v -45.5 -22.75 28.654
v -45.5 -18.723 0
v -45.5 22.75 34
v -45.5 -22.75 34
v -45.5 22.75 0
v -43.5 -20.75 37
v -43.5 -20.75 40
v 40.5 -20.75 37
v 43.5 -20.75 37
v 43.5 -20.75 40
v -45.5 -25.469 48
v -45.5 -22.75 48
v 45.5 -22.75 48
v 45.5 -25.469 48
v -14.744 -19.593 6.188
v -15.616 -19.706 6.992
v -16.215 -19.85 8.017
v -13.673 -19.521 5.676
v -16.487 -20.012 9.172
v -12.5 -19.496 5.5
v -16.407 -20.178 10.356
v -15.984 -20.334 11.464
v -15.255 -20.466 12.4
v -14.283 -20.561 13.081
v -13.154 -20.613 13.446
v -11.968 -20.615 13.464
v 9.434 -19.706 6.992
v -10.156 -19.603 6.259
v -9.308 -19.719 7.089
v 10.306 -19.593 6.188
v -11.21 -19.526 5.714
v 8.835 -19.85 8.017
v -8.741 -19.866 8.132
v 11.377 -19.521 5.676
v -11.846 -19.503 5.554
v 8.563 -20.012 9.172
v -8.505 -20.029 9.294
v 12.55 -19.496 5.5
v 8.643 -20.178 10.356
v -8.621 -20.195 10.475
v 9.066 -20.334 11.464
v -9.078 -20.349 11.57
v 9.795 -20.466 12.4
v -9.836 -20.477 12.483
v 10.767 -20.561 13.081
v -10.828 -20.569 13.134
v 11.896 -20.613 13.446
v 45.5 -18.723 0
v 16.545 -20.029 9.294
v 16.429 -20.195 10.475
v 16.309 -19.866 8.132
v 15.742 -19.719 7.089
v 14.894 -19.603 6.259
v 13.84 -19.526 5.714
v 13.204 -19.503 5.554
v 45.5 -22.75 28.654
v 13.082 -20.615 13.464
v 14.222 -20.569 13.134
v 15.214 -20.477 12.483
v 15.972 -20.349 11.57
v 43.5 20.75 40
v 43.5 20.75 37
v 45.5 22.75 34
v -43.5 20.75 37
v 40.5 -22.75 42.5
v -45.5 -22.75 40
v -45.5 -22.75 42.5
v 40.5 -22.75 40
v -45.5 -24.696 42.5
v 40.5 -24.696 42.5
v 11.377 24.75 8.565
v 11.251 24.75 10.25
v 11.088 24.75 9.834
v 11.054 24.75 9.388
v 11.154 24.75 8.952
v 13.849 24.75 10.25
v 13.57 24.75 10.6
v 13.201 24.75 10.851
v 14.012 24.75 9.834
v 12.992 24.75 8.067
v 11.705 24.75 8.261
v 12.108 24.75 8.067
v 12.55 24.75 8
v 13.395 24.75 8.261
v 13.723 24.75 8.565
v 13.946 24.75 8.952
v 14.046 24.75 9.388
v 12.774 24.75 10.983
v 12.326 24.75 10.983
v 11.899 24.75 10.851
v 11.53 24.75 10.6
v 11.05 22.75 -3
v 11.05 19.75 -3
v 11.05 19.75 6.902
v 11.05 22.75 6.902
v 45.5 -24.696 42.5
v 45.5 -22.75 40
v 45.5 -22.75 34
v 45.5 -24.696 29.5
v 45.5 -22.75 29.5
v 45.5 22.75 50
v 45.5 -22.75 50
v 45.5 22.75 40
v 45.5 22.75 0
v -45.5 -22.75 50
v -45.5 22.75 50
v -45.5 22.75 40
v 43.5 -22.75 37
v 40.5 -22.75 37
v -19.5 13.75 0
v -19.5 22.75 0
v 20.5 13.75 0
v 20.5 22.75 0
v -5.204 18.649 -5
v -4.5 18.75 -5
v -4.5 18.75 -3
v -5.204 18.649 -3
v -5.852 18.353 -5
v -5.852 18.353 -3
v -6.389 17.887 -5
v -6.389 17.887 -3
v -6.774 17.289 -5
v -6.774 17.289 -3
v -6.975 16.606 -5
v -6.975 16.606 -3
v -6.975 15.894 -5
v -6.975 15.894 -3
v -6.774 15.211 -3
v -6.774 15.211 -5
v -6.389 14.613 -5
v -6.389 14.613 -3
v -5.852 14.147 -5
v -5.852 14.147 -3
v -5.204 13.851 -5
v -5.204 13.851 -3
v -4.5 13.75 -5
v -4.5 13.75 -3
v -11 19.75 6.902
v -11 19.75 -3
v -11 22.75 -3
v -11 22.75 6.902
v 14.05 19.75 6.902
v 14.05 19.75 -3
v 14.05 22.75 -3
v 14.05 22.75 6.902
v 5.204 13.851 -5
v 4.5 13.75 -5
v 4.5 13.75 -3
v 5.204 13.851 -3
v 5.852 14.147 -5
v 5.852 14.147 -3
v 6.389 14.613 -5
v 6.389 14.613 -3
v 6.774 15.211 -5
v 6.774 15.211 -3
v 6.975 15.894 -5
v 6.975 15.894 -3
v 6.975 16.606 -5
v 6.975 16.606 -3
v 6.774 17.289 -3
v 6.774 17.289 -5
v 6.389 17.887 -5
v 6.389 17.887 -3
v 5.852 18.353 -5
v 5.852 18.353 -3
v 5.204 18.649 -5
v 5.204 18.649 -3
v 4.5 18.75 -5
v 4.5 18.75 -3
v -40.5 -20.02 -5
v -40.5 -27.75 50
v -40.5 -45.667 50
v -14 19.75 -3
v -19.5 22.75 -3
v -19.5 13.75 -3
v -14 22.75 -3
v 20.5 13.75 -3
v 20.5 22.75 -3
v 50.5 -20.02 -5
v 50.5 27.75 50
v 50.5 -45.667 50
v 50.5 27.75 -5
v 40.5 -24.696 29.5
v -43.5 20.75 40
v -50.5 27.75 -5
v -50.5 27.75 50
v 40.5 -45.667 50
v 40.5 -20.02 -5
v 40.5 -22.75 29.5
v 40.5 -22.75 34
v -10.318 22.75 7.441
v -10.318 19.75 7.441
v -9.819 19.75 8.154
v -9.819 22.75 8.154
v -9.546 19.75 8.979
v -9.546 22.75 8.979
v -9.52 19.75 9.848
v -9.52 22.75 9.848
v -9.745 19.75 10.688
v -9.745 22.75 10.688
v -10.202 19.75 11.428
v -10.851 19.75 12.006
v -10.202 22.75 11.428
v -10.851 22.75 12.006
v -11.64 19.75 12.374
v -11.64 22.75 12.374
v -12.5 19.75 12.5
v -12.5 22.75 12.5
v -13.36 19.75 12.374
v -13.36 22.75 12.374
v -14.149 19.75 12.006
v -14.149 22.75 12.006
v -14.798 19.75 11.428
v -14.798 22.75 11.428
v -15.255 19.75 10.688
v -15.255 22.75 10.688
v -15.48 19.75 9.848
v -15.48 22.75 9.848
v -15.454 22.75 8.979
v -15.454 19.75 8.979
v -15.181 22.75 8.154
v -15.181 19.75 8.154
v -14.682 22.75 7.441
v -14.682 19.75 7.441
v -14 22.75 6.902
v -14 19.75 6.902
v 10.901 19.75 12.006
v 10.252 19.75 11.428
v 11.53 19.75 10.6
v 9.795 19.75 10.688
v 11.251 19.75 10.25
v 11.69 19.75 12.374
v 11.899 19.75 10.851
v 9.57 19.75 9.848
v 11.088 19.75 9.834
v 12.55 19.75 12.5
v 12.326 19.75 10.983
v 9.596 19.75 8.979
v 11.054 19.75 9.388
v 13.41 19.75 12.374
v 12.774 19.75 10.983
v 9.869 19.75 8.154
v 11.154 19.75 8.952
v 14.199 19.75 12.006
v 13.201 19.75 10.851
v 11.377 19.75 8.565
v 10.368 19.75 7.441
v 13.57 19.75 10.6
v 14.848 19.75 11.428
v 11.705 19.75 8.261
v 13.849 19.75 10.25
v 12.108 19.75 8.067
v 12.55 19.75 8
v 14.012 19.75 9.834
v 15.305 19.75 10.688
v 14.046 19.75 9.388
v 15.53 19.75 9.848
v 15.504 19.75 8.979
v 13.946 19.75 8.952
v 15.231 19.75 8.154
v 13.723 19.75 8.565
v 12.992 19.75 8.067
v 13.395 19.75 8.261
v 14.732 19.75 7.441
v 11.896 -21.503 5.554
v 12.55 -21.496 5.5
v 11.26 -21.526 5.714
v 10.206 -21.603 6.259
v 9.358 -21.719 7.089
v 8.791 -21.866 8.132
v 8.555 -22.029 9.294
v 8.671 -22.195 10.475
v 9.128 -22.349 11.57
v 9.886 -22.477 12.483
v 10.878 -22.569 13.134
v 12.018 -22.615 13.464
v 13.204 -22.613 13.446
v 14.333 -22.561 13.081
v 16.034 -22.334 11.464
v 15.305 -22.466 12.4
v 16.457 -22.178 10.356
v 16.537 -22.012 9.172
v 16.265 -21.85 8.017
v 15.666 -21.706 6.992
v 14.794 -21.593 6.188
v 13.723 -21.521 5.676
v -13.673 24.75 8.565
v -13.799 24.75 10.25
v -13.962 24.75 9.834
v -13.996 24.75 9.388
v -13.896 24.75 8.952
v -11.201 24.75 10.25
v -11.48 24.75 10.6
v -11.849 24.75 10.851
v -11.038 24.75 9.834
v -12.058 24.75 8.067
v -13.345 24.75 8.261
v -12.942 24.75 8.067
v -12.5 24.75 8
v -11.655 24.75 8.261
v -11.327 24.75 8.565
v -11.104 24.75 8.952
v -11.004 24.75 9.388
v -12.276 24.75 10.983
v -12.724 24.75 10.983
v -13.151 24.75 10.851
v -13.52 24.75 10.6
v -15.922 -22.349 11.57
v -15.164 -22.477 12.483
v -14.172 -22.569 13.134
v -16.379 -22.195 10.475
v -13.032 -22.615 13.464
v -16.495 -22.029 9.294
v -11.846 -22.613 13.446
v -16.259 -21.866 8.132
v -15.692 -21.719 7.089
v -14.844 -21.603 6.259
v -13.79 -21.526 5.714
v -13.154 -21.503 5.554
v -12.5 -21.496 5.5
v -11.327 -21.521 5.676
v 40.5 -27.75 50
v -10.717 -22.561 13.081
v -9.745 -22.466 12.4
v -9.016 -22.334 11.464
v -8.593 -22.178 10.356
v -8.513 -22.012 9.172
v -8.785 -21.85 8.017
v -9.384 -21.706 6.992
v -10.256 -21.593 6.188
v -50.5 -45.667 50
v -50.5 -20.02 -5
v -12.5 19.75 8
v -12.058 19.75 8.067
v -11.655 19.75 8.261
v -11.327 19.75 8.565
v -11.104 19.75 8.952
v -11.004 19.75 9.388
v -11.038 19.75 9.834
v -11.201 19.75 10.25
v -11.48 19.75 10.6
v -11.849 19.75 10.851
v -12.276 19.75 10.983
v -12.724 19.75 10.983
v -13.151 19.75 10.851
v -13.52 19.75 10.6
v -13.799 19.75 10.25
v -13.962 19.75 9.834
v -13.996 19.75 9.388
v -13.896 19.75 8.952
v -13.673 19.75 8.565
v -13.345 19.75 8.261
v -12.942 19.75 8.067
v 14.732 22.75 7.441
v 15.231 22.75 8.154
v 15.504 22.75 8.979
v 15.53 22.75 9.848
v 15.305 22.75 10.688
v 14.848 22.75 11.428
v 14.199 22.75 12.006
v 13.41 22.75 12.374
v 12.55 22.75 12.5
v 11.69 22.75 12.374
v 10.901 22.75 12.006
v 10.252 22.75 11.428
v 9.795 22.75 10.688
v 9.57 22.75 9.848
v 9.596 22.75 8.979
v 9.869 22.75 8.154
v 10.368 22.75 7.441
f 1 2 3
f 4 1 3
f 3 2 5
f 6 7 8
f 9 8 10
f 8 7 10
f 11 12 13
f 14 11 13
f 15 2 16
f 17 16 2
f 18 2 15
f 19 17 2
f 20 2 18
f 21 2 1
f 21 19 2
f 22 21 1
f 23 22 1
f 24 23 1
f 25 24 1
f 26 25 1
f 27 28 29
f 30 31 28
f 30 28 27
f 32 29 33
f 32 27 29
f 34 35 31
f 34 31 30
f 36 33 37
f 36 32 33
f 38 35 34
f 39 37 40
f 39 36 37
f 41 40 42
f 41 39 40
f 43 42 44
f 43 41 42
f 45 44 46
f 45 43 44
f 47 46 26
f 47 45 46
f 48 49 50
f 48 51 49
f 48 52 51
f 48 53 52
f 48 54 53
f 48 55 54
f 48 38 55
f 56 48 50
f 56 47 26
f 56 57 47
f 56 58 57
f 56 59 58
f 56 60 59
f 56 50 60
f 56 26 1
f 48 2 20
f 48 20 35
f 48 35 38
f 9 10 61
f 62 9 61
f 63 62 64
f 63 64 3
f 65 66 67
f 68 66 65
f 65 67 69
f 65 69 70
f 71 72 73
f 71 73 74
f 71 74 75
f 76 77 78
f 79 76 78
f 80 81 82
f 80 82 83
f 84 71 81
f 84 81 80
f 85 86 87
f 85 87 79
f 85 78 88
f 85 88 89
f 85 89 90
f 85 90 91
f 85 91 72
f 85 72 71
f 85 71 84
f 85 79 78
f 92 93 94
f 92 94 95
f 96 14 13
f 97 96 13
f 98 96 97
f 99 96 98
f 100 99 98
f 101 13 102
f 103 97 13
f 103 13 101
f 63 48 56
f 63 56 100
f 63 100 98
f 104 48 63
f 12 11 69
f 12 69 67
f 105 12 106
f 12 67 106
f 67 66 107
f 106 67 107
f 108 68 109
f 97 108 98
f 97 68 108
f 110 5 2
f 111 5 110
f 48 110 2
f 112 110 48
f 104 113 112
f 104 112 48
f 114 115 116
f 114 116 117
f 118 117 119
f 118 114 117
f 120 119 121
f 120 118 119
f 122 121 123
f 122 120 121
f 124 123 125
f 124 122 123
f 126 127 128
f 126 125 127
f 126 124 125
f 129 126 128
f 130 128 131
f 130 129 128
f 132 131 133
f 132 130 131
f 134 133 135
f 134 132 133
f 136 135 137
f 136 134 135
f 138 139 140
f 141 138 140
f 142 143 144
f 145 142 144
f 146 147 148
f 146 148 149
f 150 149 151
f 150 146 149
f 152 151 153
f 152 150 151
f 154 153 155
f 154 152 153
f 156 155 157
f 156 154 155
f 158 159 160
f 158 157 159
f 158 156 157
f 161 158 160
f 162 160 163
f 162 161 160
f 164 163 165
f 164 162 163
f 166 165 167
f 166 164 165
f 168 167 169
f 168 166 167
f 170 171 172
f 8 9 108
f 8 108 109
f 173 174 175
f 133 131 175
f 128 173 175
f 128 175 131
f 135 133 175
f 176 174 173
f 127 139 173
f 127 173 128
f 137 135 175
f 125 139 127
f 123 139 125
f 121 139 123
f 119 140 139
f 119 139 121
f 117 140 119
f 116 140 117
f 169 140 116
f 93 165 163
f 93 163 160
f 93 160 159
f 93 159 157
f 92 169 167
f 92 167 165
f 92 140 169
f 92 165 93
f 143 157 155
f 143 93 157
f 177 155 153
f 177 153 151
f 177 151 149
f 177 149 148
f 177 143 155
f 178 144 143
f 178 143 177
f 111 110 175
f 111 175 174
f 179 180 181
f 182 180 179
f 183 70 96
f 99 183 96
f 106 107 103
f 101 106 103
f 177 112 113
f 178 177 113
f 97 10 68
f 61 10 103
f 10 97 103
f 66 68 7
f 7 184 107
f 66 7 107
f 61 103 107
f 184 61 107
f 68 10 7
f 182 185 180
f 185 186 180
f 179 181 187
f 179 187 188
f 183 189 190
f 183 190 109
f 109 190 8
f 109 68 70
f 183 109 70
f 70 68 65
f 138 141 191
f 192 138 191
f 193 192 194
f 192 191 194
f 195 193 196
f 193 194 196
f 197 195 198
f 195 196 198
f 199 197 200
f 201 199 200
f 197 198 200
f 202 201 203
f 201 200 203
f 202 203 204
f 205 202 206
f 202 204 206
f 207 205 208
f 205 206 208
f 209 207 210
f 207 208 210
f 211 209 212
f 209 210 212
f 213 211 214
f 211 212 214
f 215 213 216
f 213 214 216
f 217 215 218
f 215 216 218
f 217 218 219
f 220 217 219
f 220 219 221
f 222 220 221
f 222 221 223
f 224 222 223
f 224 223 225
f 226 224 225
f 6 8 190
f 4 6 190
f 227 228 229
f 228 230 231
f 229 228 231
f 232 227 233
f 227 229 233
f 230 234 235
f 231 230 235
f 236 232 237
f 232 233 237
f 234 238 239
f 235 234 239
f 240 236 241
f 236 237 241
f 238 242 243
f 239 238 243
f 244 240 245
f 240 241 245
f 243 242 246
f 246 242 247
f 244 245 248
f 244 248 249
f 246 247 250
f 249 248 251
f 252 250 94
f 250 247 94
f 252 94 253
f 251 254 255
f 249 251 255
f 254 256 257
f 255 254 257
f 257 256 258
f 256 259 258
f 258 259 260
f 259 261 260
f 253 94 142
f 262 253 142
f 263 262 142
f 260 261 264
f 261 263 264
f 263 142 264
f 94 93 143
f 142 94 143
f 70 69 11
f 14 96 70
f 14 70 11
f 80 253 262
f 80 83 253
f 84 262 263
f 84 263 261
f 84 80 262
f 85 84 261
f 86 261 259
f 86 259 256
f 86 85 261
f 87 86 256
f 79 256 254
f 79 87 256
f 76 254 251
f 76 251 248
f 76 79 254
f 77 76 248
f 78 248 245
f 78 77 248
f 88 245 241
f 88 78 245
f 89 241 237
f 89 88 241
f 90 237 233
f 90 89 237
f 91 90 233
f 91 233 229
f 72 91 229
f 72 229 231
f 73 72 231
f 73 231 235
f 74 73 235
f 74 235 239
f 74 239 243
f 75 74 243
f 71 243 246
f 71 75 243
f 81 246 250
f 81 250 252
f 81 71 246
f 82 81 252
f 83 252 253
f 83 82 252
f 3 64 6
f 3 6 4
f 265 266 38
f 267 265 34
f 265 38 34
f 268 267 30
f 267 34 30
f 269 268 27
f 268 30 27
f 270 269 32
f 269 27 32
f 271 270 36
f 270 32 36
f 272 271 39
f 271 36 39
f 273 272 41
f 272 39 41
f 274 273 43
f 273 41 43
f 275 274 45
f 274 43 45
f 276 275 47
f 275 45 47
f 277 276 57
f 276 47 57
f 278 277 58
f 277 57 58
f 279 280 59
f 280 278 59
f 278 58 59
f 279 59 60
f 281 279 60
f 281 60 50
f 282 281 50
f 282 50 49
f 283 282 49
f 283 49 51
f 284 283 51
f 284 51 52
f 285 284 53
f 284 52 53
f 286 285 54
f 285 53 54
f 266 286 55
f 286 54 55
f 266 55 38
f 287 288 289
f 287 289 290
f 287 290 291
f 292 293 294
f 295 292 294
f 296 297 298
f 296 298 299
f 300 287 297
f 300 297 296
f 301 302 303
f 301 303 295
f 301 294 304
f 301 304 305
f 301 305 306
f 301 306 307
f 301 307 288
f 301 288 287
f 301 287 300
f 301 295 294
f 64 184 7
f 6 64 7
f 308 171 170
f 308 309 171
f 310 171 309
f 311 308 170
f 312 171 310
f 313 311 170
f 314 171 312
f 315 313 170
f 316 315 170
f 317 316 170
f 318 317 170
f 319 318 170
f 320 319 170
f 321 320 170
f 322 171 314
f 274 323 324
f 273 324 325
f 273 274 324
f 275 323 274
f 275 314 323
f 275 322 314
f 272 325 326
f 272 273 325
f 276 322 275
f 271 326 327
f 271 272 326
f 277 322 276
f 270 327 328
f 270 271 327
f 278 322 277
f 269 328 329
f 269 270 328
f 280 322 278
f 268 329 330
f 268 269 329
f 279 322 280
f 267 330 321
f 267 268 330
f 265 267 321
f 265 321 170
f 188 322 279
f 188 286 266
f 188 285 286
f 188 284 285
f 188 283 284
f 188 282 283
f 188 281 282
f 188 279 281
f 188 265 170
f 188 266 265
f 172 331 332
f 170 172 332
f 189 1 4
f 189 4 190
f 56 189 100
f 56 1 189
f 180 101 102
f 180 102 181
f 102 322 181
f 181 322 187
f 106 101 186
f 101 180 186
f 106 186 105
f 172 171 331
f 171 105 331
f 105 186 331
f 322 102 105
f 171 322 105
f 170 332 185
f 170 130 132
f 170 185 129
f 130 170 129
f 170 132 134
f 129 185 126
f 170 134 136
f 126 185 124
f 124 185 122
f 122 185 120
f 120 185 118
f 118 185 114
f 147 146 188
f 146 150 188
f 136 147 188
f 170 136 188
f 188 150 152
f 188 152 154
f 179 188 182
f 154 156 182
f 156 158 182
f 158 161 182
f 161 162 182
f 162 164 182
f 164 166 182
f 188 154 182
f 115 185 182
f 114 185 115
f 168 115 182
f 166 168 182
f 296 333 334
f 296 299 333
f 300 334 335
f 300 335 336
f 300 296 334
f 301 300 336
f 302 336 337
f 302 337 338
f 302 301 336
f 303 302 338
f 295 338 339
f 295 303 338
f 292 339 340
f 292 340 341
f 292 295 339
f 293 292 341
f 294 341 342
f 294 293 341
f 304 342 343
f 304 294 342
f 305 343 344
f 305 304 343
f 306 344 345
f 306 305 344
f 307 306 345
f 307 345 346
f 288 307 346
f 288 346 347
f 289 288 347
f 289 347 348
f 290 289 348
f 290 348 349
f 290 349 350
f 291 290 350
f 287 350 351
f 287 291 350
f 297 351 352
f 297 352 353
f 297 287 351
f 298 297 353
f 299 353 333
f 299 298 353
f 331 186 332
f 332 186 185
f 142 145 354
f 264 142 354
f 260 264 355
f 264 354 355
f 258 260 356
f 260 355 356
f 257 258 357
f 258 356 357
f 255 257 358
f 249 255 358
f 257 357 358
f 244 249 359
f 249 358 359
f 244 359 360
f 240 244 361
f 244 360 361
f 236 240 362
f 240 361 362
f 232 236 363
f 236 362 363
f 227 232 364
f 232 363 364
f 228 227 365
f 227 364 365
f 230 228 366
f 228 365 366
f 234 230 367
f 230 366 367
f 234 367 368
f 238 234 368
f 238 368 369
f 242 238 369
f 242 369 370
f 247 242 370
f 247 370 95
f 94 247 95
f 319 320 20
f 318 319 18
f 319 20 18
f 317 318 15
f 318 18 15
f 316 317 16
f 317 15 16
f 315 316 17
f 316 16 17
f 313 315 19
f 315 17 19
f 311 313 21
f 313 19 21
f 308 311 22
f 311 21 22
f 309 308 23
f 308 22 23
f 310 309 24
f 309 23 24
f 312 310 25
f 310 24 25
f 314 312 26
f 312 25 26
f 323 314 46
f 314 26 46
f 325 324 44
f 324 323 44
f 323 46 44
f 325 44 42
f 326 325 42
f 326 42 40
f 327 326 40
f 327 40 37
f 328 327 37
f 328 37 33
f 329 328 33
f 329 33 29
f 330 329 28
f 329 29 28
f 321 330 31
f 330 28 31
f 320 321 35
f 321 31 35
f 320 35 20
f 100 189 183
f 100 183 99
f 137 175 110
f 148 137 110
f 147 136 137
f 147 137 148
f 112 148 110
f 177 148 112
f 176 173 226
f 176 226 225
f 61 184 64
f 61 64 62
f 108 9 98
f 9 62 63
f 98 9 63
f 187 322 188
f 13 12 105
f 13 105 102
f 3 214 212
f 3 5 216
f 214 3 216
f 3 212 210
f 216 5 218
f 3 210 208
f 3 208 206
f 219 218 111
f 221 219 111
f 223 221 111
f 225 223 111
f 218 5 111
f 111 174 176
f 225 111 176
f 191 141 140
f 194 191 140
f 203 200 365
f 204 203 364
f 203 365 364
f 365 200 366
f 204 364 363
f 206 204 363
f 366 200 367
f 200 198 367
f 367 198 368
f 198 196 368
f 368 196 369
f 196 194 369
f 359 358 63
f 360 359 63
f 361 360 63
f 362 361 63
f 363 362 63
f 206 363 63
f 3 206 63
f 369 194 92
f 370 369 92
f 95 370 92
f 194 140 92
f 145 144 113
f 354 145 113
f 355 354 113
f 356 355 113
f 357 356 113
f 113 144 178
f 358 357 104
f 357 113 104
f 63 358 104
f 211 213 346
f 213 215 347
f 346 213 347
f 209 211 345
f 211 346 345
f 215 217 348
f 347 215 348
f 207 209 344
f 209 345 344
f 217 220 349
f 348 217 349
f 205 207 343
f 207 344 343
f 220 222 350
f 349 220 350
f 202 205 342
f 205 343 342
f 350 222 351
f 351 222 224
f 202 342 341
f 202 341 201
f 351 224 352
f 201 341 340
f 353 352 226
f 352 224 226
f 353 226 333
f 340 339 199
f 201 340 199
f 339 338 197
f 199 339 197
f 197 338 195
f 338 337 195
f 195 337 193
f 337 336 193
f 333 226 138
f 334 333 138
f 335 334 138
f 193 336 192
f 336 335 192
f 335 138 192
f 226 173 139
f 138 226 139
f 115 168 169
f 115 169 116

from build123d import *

# Parameters (mm, degrees)
SKETCH_1_W          = 101
SKETCH_1_H          = 55.5
SKETCH_1_W_2        = 91
SKETCH_1_H_2        = 45.5
EXTRUDE_1_DEPTH     = 50
SKETCH_2_W          = 101
SKETCH_2_H          = 55.5
EXTRUDE_2_DEPTH     = 5
SKETCH_4_W          = 101
SKETCH_4_H          = 3
EXTRUDE_3_DEPTH     = 2
SKETCH_7_W          = 91
SKETCH_7_H          = 5.5
CUT_EXTRUDE_1_DEPTH = 3
SKETCH_9_W          = 40
SKETCH_9_H          = 9
CUT_EXTRUDE_2_DEPTH = 3
CUT_EXTRUDE_3_DEPTH = 10
CUT_EXTRUDE_4_DEPTH = 106
EXTRUDE_4_DEPTH     = 100
SKETCH_13_R         = 4
CUT_EXTRUDE_5_DEPTH = 137
SKETCH_14_R         = 3
SKETCH_14_R_2       = 1.5
EXTRUDE_5_DEPTH     = 3
CUT_EXTRUDE_START   = -2
SKETCH_14_3_R       = 1.5
CUT_EXTRUDE_6_DEPTH = 2
EXTRUDE_6_DEPTH     = 3
EXTRUDE_7_DEPTH     = 10
EXTRUDE_9_REACH     = 100.647
EXTRUDE_8_REACH     = 88.283
SKETCH_18_W         = 3
SKETCH_18_H         = 3
SKETCH_19_W         = 5
SKETCH_19_H         = 1.94594374
CUT_EXTRUDE_7_DEPTH = 13
EXTRUDE_10_REACH    = 119.48
EXTRUDE_11_DEPTH    = 86


with BuildPart() as part:
    # 草图1 → 凸台-拉伸1 (new body)
    with BuildSketch(Plane.XY):
        Rectangle(SKETCH_1_W, SKETCH_1_H)
        Rectangle(SKETCH_1_W_2, SKETCH_1_H_2, mode=Mode.SUBTRACT)
    extrude(amount=EXTRUDE_1_DEPTH)

    # 草图2 → 凸台-拉伸2 (add)
    with BuildSketch(Plane.XY):
        Rectangle(SKETCH_2_W, SKETCH_2_H)
    extrude(amount=-EXTRUDE_2_DEPTH)

    # 草图4 → 凸台-拉伸3 (add)
    with BuildSketch(Plane.XZ.offset(-22.75)):
        with Locations((0, 38.5)):
            Rectangle(SKETCH_4_W, SKETCH_4_H)
    extrude(amount=EXTRUDE_3_DEPTH)

    # 草图7 → 切除-拉伸1 (cut)
    with BuildSketch(Plane(origin=(0, -22.75, 0), x_dir=(1, 0, 0), z_dir=(0, 1, 0))):
        with Locations((0, -45.25)):
            Rectangle(SKETCH_7_W, SKETCH_7_H)
    extrude(amount=-CUT_EXTRUDE_1_DEPTH, mode=Mode.SUBTRACT)

    # 草图9 → 切除-拉伸2 (cut)
    with BuildSketch(Plane.XY):
        with Locations((0.5, 18.25)):
            Rectangle(SKETCH_9_W, SKETCH_9_H)
    extrude(amount=-CUT_EXTRUDE_2_DEPTH, mode=Mode.SUBTRACT)

    # 草图10 → 切除-拉伸3 (cut)
    with BuildSketch(Plane(origin=(0, 0, -5), x_dir=(-1, 0, 0), z_dir=(0, 0, -1))):
        with BuildLine():
            Line((-4.5, 18.75), (4.5, 18.75))
            ThreePointArc((4.5, 18.75), (7, 16.25), (4.5, 13.75))
            Line((4.5, 13.75), (-4.5, 13.75))
            ThreePointArc((-4.5, 13.75), (-7, 16.25), (-4.5, 18.75))
        make_face()
    extrude(amount=-CUT_EXTRUDE_3_DEPTH, mode=Mode.SUBTRACT)

    # 草图11 → 切除-拉伸4 (cut)
    with BuildSketch(Plane(origin=(50.5, 0, 0), x_dir=(0, 0, -1), z_dir=(1, 0, 0))):
        Polygon((-50, -27.75), (5, -20.020254091), (5, -27.75), align=None)
    extrude(amount=-CUT_EXTRUDE_4_DEPTH, mode=Mode.SUBTRACT)

    # 草图12 → 凸台-拉伸4 (add)
    with BuildSketch(Plane(origin=(50.5, 0, 0), x_dir=(0, 0, -1), z_dir=(1, 0, 0))):
        Polygon((5, -20.020254091), (5, -18.020254091), (-50, -25.75), (-50, -27.75), align=None)
    extrude(amount=-EXTRUDE_4_DEPTH)

    # 草图13 → 切除-拉伸5 (cut)
    with BuildSketch(Plane(origin=(0, 0, 0), x_dir=(1, 0, 0), z_dir=(0, 1, 0))):
        with Locations(Location((-12.5, -9.5, 0), (0, 0, 90))):
            Circle(SKETCH_13_R)
        with Locations(Location((12.55, -9.5, 0), (0, 0, 90))):
            Circle(SKETCH_13_R)
    extrude(amount=-CUT_EXTRUDE_5_DEPTH, mode=Mode.SUBTRACT)

    # 草图14 → 凸台-拉伸5 (add)
    # profile 1 of 2: a face of its own
    with BuildSketch(Plane.XZ.offset(-22.75)):
        with Locations(Location((-12.5, 9.5, 0), (0, 0, 270))):
            Circle(SKETCH_14_R)
        with Locations(Location((-12.5, 9.5, 0), (0, 0, 270))):
            Circle(SKETCH_14_R_2, mode=Mode.SUBTRACT)
    # profile 2 of 2: a face of its own
    with BuildSketch(Plane.XZ.offset(-22.75)):
        with Locations(Location((12.55, 9.5, 0), (0, 0, 270))):
            Circle(SKETCH_14_R)
        with Locations(Location((12.55, 9.5, 0), (0, 0, 270))):
            Circle(SKETCH_14_R_2, mode=Mode.SUBTRACT)
    extrude(amount=EXTRUDE_5_DEPTH)

    # 草图14<3> → 切除-拉伸6 (cut)
    with BuildSketch(Plane.XZ.offset(-22.75).offset(CUT_EXTRUDE_START)):
        with Locations(Location((-12.5, 9.5, 0), (0, 0, 270))):
            Circle(SKETCH_14_3_R)
        with Locations(Location((12.55, 9.5, 0), (0, 0, 270))):
            Circle(SKETCH_14_3_R)
    extrude(amount=CUT_EXTRUDE_6_DEPTH, mode=Mode.SUBTRACT)

    # 草图15 → 凸台-拉伸6 (add)
    with BuildSketch(Plane.XY.offset(40)):
        Polygon((-45.5, 20.75), (-43.5, 20.75), (-43.5, -20.75), (43.5, -20.75), (43.5, 20.75), (45.5, 20.75), (45.5, -22.75), (43.3124719, -22.75), (-43.5, -22.75), (-45.5, -22.75), align=None)
    extrude(amount=-EXTRUDE_6_DEPTH)

    # 草图17 → 凸台-拉伸7 (add)
    with BuildSketch(Plane(origin=(50.5, 0, 0), x_dir=(0, 0, -1), z_dir=(1, 0, 0))):
        Polygon((-50, -27.75), (-50, -45.66717529), (5, -20.020254091), align=None)
    extrude_7 = extrude(amount=-EXTRUDE_7_DEPTH)

    # 镜向1: 凸台-拉伸7 across plane
    add(extrude_7.mirror(Plane(origin=(0, 0, 0), x_dir=(0, 0, 1), z_dir=(1, 0, 0))))

    # 草图21 → 凸台-拉伸9 (add, up to next)
    with BuildSketch(Plane.XZ.offset(-22.75), mode=Mode.PRIVATE) as extrude_9_sk1:
        Polygon((-45.5, 34), (-45.5, 37), (-43.5, 37), align=None)
    extrude_9_tool1 = extrude(extrude_9_sk1.sketch, amount=EXTRUDE_9_REACH, mode=Mode.PRIVATE) - part.part
    extrude_9 = extrude_9_tool1.solids().sort_by_distance((-44.833333, 22.75, 36))[0]
    add(extrude_9)

    # 镜向2: 凸台-拉伸9 across plane
    add(extrude_9.mirror(Plane(origin=(0, 0, 0), x_dir=(0, 0, 1), z_dir=(1, 0, 0))))

    # 草图18 → 凸台-拉伸8 (add, up to next)
    with BuildSketch(Plane.XY.offset(-3), mode=Mode.PRIVATE) as extrude_8_sk1:
        with Locations((-12.5, 21.25)):
            Rectangle(SKETCH_18_W, SKETCH_18_H)
    extrude_8_tool1 = extrude(extrude_8_sk1.sketch, amount=EXTRUDE_8_REACH, mode=Mode.PRIVATE) - part.part
    # 草图18 → 凸台-拉伸8 (add, up to next)
    with BuildSketch(Plane.XY.offset(-3), mode=Mode.PRIVATE) as extrude_8_sk2:
        with Locations((12.55, 21.25)):
            Rectangle(SKETCH_18_W, SKETCH_18_H)
    extrude_8_tool2 = extrude(extrude_8_sk2.sketch, amount=EXTRUDE_8_REACH, mode=Mode.PRIVATE) - part.part
    add(extrude_8_tool1.solids().sort_by_distance((-12.5, 21.25, -3))[0])
    add(extrude_8_tool2.solids().sort_by_distance((12.55, 21.25, -3))[0])

    # 草图19 → 切除-拉伸7 (cut)
    with BuildSketch(Plane.XY.offset(42.5)):
        with Locations((43, -23.72297187)):
            Rectangle(SKETCH_19_W, SKETCH_19_H)
    extrude(amount=-CUT_EXTRUDE_7_DEPTH, mode=Mode.SUBTRACT)

    # 凸台-拉伸10: up to this plane
    extrude_10_end = Plane(origin=(-43.5, -45.66917529, 37), z_dir=(-0.8320502943378437, 0, 0.5547001962252291))
    # 草图23 → 凸台-拉伸10 (add, up to the surface)
    with BuildSketch(Plane.ZY.offset(-45.5), mode=Mode.PRIVATE) as extrude_10_sk1:
        Polygon((34, 22.75), (37, 22.75), (37, 20.75), align=None)
    extrude_10_tool1 = split(extrude(extrude_10_sk1.sketch, amount=EXTRUDE_10_REACH, mode=Mode.PRIVATE), bisect_by=extrude_10_end, keep=Keep.BOTH, mode=Mode.PRIVATE)
    add(extrude_10_tool1.solids().sort_by_distance((45.5, 22.083333, 36))[0])

    # 草图24 → 凸台-拉伸11 (add)
    with BuildSketch(Plane(origin=(-45.5, 0, 0), x_dir=(0, 0, -1), z_dir=(1, 0, 0))):
        Polygon((-34, -22.75), (-37, -22.75), (-37, -20.75), align=None)
    extrude(amount=EXTRUDE_11_DEPTH)


solid = part.part
